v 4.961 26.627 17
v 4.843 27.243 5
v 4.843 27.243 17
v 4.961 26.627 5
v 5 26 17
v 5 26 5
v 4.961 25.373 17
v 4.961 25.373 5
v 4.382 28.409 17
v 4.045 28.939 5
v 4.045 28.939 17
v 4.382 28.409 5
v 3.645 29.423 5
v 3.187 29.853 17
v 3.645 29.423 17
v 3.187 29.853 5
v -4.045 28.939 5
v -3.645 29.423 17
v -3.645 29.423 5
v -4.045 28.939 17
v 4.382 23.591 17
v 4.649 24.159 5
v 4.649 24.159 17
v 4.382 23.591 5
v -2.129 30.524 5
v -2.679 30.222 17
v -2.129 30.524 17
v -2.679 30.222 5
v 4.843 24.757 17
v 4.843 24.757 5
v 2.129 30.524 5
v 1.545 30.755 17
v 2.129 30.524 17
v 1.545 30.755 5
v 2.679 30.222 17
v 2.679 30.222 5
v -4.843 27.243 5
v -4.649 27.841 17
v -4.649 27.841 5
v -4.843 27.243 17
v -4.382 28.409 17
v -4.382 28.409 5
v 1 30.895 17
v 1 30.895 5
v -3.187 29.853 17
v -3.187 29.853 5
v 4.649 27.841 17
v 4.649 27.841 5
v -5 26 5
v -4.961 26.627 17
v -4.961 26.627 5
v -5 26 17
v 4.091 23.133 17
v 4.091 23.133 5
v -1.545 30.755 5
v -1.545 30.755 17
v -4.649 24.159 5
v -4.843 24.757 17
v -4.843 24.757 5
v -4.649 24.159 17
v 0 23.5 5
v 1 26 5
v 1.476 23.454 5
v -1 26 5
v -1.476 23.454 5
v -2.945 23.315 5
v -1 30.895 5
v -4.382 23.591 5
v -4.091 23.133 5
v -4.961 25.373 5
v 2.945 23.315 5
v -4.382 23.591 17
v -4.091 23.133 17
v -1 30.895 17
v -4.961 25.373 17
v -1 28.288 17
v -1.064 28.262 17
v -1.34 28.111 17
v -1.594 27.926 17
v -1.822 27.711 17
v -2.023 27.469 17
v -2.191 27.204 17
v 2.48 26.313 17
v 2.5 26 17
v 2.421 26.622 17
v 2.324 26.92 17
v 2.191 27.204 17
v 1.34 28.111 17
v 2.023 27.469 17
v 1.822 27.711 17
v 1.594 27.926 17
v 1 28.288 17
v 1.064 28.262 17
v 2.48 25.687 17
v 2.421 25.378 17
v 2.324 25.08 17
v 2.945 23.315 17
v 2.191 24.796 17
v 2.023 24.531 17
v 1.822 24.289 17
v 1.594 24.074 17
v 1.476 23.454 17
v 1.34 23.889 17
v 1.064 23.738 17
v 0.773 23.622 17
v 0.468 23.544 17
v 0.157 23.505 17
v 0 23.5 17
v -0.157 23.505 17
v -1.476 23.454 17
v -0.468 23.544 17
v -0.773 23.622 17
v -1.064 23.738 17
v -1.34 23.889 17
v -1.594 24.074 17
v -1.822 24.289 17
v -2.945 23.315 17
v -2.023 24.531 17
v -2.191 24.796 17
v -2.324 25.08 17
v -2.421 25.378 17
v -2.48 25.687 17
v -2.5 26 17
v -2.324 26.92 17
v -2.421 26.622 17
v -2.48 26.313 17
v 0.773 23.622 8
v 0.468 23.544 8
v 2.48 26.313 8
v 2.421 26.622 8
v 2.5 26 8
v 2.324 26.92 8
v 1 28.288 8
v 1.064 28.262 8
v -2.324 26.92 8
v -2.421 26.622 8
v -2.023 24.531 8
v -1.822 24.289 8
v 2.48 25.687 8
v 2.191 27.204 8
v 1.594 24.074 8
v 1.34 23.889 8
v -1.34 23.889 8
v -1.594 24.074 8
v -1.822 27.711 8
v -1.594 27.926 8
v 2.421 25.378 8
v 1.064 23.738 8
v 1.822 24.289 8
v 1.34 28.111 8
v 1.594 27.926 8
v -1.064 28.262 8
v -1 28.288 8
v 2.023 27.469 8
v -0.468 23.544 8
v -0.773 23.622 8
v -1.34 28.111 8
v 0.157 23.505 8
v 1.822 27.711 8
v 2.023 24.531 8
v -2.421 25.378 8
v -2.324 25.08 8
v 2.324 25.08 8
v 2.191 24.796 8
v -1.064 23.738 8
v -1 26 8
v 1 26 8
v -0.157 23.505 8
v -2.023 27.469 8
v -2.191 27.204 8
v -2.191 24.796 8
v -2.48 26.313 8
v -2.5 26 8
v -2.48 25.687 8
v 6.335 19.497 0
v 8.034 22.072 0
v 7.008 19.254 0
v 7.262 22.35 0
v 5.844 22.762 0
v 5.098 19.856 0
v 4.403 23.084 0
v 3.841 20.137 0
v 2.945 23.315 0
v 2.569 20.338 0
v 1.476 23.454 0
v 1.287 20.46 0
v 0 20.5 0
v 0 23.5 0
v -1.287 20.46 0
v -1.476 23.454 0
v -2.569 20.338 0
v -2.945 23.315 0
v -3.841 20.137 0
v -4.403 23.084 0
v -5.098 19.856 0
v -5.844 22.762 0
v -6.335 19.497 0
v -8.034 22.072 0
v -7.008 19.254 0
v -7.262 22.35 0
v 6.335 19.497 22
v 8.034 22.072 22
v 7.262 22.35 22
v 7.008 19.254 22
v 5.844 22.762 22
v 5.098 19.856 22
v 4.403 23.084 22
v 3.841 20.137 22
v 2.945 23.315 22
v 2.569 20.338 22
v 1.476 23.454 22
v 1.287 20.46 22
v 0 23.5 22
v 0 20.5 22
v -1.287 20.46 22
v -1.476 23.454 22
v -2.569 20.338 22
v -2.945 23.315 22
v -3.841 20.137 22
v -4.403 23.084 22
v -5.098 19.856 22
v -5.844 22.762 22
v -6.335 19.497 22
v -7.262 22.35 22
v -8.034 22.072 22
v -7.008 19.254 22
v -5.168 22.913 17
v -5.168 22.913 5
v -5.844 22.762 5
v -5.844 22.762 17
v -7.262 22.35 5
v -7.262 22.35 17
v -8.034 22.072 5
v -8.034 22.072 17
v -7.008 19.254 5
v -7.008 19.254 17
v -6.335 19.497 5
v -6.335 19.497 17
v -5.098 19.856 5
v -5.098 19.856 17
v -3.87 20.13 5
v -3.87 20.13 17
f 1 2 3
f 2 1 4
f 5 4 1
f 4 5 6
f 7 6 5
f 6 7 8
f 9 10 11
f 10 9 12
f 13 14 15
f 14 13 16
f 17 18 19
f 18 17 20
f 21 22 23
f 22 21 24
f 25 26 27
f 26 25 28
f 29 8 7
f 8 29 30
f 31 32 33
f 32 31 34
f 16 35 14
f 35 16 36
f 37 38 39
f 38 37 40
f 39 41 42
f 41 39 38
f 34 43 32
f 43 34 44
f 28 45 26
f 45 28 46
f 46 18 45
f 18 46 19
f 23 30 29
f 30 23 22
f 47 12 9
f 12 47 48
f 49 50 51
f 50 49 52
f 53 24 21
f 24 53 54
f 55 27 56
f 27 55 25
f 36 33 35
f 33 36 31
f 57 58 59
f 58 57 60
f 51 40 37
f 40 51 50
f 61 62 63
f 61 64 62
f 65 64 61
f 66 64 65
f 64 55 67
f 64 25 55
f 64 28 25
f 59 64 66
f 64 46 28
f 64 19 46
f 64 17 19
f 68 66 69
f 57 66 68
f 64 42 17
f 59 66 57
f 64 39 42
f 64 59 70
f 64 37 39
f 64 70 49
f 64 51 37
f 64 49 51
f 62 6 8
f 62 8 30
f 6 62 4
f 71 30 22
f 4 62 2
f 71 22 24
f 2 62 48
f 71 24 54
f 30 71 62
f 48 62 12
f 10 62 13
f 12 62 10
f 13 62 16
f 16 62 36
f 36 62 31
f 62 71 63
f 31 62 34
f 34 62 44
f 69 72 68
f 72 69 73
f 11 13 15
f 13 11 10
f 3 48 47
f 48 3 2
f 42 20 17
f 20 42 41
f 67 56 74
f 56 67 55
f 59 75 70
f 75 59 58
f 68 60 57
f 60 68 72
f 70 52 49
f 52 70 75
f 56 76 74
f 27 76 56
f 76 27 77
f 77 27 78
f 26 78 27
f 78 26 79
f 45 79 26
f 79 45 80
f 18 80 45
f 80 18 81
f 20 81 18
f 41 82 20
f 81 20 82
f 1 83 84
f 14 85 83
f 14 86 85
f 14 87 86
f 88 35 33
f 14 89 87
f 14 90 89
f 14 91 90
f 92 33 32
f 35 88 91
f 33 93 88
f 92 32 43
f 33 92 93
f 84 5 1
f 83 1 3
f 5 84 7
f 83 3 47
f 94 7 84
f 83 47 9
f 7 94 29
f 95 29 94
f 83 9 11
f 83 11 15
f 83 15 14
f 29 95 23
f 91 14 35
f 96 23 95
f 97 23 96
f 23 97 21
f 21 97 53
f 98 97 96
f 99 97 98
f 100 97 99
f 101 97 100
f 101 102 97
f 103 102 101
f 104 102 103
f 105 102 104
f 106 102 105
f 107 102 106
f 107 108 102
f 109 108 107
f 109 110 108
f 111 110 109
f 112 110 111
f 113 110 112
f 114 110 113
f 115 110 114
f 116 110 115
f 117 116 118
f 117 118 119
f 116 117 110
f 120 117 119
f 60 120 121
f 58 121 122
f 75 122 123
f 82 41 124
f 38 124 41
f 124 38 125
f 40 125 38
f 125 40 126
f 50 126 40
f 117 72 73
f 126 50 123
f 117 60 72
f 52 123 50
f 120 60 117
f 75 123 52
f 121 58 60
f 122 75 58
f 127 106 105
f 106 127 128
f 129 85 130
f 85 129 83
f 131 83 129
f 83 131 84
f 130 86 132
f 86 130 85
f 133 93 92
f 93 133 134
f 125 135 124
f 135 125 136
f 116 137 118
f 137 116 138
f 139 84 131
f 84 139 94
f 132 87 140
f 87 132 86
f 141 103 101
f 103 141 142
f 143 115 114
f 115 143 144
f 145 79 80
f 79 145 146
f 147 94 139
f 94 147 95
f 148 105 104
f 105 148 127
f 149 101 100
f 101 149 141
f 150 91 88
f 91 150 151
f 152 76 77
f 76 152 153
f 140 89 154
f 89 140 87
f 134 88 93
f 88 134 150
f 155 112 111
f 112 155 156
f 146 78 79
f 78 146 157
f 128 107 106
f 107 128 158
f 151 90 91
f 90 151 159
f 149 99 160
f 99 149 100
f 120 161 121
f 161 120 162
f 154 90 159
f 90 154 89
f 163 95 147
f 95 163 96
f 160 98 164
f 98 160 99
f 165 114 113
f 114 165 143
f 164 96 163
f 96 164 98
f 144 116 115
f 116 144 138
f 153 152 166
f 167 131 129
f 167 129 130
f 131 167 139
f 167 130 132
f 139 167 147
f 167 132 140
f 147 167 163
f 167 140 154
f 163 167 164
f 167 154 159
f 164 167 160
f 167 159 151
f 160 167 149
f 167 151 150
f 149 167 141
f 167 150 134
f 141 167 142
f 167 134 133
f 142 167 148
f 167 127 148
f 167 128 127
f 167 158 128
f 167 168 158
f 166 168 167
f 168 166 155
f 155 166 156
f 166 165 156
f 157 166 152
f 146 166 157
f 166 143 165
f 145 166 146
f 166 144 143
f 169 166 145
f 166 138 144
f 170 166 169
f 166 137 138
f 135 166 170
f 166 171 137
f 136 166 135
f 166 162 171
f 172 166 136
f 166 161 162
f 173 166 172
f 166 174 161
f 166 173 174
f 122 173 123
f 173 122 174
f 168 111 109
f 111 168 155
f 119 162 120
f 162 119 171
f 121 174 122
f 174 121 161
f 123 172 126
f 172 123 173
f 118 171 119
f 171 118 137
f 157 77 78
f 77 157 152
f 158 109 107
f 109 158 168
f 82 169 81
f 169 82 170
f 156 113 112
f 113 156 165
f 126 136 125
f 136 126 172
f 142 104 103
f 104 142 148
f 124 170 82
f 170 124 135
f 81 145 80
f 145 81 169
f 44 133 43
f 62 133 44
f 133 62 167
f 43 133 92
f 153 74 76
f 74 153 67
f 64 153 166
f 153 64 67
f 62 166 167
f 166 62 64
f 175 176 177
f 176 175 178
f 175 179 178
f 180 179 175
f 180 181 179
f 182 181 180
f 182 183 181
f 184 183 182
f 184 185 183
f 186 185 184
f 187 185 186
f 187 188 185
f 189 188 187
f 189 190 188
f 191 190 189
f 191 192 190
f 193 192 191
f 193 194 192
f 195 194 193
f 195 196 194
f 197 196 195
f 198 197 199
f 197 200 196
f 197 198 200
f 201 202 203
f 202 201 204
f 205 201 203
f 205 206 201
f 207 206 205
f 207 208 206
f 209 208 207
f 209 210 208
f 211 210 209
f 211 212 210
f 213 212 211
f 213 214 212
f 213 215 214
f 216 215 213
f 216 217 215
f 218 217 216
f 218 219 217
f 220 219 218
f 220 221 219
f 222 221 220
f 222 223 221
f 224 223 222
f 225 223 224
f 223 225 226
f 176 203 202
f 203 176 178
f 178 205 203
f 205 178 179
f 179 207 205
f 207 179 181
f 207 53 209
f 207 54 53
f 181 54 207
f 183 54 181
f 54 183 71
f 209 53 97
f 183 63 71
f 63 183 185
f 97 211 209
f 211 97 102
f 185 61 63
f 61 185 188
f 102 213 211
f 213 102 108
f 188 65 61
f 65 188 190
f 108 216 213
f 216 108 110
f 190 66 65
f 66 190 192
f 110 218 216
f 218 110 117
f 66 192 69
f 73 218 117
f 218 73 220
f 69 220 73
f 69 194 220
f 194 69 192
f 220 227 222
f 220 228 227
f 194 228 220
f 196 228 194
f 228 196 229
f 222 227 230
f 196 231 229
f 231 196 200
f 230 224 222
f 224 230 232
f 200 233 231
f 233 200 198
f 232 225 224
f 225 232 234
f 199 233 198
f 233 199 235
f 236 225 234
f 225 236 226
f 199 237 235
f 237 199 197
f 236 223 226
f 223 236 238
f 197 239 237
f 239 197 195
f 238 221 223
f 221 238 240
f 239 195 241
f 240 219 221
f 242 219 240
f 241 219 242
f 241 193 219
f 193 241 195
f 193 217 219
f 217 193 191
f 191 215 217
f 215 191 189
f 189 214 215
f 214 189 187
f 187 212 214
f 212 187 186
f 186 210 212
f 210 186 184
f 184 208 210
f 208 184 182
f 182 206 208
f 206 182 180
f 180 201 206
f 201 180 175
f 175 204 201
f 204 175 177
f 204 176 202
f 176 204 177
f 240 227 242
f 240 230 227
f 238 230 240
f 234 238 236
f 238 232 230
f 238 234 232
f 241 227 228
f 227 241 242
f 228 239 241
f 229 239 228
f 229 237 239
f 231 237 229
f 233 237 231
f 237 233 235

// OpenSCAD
D_BIG = 41; //mm the frame tube

H_BIG = 3; //mm the frameclamp thickness

D_CAB = 5; //mm shifter cable housing

D_RNG =  10; //mm the diameter of the piece

L_RNG = 12; // the length of the  piece



module sector(radius, angles, fn = 24) {
    r = radius / cos(180 / fn);
    step = -360 / fn;

    points = concat([[0, 0]],
        [for(a = [angles[0] : step : angles[1] - 360]) 
            [r * cos(a), r * sin(a)]
        ],
        [[r * cos(angles[1]), r * sin(angles[1])]]
    );

    difference() {
        circle(radius, $fn = fn);
        polygon(points);
    }
}

module arc(radius, angles, width = 1, fn = 24) {
    difference() {
        sector(radius + width, angles, fn);
        sector(radius, angles, fn);
    }
} 

difference() {
union() {
    // the tube clamp
    linear_extrude(L_RNG + 10) arc(D_BIG/2, [70, 110], H_BIG, fn=100);

    // the ring
    translate([0, D_BIG/2 + D_RNG/2 +0.5, 5])
    difference(){
        cylinder(d=D_RNG, h=L_RNG,$fn=50);

        translate([0,0,3]) cylinder(d=D_CAB, h=L_RNG, $fn=50);

        translate([-1,0,0])cube([2,10,L_RNG]);
    }
}

rotate([0,0,25]) translate([-D_RNG/2, D_BIG/2 -2 , 5]) cube([D_RNG,D_RNG,L_RNG]);
}
